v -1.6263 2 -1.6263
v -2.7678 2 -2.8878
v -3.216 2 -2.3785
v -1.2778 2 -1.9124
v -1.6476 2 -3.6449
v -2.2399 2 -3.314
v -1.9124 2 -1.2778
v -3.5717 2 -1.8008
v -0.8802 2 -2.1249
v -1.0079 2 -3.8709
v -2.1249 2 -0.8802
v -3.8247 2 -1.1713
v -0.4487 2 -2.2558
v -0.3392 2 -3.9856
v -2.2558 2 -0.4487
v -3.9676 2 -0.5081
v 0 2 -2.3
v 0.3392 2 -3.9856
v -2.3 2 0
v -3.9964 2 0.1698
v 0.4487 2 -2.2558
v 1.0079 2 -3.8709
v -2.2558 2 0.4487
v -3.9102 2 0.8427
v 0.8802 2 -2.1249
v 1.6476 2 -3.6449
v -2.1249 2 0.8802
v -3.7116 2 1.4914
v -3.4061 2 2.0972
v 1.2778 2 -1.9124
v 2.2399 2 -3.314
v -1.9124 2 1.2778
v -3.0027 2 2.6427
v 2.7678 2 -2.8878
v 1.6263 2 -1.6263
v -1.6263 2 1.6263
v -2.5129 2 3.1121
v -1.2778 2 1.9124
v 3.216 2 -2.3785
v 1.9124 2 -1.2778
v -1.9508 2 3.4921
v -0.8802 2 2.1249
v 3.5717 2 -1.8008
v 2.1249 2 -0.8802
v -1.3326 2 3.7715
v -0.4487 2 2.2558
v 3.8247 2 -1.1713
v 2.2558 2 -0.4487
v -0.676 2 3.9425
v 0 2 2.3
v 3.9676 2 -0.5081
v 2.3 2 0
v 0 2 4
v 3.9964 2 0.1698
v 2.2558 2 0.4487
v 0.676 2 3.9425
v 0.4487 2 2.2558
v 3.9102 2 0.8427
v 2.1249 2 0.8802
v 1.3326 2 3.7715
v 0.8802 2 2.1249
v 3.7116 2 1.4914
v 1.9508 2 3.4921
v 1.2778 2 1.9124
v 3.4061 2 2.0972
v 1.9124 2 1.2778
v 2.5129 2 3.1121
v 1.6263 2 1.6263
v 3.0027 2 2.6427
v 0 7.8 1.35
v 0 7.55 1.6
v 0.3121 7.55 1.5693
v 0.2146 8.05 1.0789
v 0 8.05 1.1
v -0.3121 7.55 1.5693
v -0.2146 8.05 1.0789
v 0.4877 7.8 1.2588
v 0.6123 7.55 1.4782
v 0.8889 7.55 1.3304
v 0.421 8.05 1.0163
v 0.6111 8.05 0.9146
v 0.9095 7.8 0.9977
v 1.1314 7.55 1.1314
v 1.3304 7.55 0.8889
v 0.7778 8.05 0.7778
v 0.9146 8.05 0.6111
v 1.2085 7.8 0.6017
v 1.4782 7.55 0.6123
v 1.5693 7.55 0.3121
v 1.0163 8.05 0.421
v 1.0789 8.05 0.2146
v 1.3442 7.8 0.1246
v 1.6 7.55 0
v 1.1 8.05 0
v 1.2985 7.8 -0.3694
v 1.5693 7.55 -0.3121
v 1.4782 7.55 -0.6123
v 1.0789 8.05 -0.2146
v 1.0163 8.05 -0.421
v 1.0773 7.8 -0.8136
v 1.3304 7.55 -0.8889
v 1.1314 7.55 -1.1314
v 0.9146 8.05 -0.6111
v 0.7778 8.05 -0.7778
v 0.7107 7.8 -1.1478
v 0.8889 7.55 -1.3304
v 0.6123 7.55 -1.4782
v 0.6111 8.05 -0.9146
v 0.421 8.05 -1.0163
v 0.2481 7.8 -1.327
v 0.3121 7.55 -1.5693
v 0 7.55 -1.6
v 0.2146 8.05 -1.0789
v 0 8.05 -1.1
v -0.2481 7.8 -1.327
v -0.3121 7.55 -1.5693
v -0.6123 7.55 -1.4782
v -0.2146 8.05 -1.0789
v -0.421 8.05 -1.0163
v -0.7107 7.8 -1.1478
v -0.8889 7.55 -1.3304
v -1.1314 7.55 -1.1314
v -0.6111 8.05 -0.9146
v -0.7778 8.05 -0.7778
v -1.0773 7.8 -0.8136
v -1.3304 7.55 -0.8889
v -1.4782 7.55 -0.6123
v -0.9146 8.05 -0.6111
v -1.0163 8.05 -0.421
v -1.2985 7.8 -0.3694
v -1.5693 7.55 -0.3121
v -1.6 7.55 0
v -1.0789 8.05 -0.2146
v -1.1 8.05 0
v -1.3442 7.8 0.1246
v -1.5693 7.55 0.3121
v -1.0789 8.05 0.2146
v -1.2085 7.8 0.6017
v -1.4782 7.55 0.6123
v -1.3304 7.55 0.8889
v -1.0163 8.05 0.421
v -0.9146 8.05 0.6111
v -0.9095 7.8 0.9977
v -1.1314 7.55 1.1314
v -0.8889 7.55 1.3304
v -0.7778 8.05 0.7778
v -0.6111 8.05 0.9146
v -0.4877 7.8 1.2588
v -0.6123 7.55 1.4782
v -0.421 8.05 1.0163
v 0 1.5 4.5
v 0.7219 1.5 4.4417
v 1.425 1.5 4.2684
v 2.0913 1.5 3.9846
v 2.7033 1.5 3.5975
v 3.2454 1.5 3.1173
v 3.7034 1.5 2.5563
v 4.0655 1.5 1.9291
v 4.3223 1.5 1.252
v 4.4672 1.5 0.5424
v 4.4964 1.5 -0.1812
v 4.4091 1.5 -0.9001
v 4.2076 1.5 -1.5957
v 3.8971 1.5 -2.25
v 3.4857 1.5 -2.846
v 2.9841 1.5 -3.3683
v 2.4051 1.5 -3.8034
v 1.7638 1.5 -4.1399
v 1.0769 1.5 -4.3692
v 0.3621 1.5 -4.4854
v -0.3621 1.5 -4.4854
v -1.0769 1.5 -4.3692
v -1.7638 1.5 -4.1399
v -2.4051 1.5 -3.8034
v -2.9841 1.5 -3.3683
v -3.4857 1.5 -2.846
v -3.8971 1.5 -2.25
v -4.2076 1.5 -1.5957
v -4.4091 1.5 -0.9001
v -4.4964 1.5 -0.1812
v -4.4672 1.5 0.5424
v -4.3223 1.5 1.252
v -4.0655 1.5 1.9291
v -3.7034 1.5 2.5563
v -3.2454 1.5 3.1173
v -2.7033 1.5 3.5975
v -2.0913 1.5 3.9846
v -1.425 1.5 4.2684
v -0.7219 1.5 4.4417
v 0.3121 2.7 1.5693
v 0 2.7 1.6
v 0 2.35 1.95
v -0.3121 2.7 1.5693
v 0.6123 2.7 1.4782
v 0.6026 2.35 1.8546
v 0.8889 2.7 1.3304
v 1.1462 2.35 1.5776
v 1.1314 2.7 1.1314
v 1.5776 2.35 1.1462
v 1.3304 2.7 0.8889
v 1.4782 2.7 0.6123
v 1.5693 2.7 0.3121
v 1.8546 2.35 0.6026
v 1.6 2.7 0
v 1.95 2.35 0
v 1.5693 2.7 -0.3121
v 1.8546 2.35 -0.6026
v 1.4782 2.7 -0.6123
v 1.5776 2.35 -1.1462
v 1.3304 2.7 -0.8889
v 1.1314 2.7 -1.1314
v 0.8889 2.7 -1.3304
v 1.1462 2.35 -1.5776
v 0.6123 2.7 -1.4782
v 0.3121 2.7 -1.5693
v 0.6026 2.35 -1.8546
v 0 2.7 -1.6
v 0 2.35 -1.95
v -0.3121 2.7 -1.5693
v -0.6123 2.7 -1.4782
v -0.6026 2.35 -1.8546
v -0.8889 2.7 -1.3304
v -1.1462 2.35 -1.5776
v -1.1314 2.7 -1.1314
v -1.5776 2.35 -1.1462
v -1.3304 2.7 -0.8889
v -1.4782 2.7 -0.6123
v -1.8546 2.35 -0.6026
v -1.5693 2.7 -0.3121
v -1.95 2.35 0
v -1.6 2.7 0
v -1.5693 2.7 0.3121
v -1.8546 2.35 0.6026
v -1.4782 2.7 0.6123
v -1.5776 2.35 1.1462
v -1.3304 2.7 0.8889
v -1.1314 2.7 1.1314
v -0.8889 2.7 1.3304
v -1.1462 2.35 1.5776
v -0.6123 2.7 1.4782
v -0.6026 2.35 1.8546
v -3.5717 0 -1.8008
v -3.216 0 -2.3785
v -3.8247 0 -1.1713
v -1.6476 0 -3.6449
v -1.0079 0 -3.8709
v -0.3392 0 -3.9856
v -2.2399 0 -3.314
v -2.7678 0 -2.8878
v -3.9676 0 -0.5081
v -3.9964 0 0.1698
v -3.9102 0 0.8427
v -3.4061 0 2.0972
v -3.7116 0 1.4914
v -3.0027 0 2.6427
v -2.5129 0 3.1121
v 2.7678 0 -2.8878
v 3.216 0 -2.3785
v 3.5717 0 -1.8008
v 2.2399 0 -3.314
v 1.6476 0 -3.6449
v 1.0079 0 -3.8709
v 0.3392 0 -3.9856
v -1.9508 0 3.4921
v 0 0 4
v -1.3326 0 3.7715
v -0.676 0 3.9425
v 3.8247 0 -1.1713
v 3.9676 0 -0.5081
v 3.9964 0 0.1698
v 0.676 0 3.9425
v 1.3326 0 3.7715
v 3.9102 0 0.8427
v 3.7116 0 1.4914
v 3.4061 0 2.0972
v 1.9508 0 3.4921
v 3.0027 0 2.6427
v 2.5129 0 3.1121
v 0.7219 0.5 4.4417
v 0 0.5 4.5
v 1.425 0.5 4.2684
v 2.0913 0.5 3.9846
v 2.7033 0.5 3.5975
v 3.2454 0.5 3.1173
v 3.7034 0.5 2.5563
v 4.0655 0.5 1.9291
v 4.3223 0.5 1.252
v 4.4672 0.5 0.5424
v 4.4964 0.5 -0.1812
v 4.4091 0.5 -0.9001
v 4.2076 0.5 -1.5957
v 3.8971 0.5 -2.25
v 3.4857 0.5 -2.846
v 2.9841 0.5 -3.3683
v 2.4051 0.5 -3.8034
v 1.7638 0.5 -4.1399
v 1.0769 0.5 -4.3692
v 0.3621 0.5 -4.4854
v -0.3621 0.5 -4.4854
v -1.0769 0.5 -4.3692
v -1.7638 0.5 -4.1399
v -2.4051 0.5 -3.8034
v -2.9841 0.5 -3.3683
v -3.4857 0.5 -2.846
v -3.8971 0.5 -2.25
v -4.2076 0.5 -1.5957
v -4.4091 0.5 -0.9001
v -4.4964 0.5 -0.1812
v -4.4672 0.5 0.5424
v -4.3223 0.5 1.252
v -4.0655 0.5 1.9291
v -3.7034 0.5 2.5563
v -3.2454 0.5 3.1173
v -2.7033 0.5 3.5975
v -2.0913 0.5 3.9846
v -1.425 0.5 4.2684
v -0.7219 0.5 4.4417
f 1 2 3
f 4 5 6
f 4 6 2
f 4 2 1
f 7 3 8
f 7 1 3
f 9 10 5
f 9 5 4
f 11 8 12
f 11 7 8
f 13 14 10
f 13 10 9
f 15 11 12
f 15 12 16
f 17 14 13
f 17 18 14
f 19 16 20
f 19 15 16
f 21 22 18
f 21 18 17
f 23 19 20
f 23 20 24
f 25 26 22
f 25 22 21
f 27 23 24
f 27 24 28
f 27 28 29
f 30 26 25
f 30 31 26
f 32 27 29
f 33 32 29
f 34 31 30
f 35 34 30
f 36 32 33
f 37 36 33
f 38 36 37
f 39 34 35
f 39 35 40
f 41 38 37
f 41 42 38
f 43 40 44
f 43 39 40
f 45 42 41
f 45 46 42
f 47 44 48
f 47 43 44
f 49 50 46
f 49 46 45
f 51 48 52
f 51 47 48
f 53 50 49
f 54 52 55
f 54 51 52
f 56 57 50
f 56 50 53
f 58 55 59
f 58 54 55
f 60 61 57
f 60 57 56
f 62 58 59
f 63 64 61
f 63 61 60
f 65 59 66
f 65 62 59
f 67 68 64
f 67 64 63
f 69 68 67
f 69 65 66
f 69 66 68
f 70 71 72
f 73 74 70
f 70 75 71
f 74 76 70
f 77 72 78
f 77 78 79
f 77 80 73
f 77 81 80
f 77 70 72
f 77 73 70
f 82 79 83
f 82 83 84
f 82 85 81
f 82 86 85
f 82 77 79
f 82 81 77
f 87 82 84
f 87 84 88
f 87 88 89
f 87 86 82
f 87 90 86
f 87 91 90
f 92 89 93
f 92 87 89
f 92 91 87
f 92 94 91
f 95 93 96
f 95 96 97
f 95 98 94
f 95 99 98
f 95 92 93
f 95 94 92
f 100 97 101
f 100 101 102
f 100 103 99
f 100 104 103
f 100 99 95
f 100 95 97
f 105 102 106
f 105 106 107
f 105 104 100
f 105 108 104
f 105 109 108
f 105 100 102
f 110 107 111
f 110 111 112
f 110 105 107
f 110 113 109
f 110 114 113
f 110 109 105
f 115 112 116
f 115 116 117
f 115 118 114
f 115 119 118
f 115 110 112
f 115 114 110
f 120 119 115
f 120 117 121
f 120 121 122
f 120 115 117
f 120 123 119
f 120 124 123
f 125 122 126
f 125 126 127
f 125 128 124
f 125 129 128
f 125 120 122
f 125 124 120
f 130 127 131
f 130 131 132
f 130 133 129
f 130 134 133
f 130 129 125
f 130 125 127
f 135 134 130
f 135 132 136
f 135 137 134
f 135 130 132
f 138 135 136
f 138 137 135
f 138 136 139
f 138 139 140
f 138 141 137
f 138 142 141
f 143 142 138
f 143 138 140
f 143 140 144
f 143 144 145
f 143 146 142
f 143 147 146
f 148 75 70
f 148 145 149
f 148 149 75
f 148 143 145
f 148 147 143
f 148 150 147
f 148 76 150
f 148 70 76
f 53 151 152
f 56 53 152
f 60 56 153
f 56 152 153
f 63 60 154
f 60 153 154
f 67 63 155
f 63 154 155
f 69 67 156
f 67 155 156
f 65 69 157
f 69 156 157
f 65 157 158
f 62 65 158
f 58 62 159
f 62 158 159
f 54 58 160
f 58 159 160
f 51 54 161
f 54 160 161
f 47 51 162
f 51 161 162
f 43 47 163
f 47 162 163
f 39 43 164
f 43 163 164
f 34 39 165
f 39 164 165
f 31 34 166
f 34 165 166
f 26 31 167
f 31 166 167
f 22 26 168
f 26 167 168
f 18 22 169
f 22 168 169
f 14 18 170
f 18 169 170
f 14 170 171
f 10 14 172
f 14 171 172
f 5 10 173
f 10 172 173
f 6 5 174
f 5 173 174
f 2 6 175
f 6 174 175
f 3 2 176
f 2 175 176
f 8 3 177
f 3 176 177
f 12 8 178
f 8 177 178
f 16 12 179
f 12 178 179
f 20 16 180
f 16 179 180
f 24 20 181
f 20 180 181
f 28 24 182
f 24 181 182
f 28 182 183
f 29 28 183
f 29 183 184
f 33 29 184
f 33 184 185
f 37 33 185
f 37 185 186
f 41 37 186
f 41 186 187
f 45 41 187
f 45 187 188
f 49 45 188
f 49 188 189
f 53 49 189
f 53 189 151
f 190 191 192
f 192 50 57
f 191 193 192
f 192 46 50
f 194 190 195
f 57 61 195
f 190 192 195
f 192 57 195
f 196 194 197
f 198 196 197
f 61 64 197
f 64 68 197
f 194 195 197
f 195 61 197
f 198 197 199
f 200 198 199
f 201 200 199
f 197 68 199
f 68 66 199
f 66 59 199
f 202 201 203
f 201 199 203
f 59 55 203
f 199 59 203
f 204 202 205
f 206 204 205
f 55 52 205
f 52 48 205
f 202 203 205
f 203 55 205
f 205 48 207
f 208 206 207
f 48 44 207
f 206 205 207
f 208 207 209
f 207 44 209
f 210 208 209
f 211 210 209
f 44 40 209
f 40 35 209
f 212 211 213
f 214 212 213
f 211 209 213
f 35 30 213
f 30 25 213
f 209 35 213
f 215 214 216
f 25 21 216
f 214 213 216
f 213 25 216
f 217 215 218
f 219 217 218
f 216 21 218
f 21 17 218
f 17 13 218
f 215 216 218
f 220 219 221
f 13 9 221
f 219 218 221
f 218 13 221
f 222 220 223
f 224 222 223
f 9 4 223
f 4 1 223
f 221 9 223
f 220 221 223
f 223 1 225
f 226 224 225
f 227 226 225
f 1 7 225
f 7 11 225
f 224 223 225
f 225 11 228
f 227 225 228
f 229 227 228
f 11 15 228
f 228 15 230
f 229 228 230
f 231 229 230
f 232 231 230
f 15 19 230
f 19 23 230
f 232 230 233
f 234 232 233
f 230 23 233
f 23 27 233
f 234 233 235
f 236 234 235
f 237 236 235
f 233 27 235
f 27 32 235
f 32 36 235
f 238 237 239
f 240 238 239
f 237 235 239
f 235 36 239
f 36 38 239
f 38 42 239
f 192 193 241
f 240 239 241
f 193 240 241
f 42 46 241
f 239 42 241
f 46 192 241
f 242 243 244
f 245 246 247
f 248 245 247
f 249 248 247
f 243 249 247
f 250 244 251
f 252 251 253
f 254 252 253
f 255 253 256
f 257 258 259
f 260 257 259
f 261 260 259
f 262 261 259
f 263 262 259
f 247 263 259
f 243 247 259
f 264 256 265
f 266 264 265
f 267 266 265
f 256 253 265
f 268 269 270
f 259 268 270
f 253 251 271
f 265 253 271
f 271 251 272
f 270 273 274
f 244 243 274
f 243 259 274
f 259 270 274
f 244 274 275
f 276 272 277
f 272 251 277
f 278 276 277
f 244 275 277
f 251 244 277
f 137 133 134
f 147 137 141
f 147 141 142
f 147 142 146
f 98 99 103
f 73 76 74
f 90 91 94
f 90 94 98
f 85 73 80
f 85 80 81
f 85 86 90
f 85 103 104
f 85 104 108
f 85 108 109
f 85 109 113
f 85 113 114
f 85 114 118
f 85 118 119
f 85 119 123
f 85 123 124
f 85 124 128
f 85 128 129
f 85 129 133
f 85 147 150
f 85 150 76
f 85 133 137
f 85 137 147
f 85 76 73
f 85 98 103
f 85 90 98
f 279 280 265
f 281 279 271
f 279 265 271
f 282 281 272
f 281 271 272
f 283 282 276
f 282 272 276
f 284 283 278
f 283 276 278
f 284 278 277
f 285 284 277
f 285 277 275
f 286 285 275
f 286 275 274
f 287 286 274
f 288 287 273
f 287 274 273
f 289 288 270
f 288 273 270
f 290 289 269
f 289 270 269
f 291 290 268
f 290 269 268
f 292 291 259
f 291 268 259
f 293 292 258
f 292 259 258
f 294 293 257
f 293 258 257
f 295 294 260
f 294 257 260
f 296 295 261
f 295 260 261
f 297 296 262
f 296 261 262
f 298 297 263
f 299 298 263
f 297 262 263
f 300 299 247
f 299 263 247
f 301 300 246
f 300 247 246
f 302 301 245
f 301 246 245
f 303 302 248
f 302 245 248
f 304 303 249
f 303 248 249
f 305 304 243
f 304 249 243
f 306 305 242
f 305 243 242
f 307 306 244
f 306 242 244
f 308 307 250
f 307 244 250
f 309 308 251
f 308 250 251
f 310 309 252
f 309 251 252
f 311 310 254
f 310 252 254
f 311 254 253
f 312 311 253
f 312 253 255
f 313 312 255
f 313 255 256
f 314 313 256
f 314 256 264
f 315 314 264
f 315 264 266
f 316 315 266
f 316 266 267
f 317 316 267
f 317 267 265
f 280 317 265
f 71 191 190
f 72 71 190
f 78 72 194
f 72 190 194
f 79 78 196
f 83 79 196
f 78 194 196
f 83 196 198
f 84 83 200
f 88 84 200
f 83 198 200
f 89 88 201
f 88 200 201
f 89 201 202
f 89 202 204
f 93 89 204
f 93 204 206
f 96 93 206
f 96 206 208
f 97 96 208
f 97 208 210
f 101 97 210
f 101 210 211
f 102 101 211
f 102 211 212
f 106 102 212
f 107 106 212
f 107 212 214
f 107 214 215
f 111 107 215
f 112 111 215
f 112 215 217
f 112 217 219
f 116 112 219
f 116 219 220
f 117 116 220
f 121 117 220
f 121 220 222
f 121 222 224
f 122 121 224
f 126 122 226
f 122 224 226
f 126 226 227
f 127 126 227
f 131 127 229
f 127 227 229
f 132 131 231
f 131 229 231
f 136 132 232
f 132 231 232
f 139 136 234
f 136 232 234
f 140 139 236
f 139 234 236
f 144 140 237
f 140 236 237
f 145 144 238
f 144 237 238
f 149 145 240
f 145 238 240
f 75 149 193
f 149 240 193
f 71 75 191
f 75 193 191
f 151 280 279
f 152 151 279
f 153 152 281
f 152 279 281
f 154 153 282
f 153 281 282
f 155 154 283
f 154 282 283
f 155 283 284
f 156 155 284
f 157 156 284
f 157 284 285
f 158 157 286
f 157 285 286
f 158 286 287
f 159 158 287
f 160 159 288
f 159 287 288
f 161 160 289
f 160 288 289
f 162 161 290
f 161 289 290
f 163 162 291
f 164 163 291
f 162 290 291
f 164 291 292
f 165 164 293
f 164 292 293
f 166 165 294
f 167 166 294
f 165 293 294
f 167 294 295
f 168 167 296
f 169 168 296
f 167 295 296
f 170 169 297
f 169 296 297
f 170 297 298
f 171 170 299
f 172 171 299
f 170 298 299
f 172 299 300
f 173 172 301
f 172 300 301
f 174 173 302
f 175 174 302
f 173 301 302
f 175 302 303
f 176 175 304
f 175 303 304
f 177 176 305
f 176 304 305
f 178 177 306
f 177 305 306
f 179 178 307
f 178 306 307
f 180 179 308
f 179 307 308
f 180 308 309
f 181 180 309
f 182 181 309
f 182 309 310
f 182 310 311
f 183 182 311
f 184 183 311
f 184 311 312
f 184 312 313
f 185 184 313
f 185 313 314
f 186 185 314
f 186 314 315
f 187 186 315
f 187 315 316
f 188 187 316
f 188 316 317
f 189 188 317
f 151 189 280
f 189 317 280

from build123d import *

# Parameters (mm, degrees)
SKETCH1_R           = 4.5
SKETCH1_R_2         = 1.6
BOSS_EXTRUDE1_DEPTH = 2
SKETCH1_2_R         = 1.6
BOSS_EXTRUDE2_DEPTH = 8.05
CHAMFER1_SIZE       = 0.7
CHAMFER2_SIZE       = 0.5
CHAMFER3_SIZE       = 0.5


with BuildPart() as part:
    # Sketch1 → Boss-Extrude1 (new body)
    with BuildSketch(Plane(origin=(0, 0, 0), x_dir=(1, 0, 0), z_dir=(0, 1, 0))):
        Circle(SKETCH1_R)
        Circle(SKETCH1_R_2, mode=Mode.SUBTRACT)
    extrude(amount=BOSS_EXTRUDE1_DEPTH)

    # Sketch1<2> → Boss-Extrude2 (add)
    with BuildSketch(Plane(origin=(0, 0, 0), x_dir=(1, 0, 0), z_dir=(0, 1, 0))):
        Circle(SKETCH1_2_R)
    extrude(amount=BOSS_EXTRUDE2_DEPTH)

    # Chamfer1
    chamfer1_edges = [part.edges().sort_by_distance(p)[0] for p in [
        (-1.6, 2, 0),
    ]]
    chamfer(chamfer1_edges, length=CHAMFER1_SIZE)

    # Chamfer2
    chamfer2_edges = [part.edges().sort_by_distance(p)[0] for p in [
        (-4.5, 2, 0),
        (-4.5, 0, 0),
    ]]
    chamfer(chamfer2_edges, length=CHAMFER2_SIZE)

    # Chamfer3
    chamfer3_edges = [part.edges().sort_by_distance(p)[0] for p in [
        (-1.6, 8.05, 0),
    ]]
    chamfer(chamfer3_edges, length=CHAMFER3_SIZE)


solid = part.part
